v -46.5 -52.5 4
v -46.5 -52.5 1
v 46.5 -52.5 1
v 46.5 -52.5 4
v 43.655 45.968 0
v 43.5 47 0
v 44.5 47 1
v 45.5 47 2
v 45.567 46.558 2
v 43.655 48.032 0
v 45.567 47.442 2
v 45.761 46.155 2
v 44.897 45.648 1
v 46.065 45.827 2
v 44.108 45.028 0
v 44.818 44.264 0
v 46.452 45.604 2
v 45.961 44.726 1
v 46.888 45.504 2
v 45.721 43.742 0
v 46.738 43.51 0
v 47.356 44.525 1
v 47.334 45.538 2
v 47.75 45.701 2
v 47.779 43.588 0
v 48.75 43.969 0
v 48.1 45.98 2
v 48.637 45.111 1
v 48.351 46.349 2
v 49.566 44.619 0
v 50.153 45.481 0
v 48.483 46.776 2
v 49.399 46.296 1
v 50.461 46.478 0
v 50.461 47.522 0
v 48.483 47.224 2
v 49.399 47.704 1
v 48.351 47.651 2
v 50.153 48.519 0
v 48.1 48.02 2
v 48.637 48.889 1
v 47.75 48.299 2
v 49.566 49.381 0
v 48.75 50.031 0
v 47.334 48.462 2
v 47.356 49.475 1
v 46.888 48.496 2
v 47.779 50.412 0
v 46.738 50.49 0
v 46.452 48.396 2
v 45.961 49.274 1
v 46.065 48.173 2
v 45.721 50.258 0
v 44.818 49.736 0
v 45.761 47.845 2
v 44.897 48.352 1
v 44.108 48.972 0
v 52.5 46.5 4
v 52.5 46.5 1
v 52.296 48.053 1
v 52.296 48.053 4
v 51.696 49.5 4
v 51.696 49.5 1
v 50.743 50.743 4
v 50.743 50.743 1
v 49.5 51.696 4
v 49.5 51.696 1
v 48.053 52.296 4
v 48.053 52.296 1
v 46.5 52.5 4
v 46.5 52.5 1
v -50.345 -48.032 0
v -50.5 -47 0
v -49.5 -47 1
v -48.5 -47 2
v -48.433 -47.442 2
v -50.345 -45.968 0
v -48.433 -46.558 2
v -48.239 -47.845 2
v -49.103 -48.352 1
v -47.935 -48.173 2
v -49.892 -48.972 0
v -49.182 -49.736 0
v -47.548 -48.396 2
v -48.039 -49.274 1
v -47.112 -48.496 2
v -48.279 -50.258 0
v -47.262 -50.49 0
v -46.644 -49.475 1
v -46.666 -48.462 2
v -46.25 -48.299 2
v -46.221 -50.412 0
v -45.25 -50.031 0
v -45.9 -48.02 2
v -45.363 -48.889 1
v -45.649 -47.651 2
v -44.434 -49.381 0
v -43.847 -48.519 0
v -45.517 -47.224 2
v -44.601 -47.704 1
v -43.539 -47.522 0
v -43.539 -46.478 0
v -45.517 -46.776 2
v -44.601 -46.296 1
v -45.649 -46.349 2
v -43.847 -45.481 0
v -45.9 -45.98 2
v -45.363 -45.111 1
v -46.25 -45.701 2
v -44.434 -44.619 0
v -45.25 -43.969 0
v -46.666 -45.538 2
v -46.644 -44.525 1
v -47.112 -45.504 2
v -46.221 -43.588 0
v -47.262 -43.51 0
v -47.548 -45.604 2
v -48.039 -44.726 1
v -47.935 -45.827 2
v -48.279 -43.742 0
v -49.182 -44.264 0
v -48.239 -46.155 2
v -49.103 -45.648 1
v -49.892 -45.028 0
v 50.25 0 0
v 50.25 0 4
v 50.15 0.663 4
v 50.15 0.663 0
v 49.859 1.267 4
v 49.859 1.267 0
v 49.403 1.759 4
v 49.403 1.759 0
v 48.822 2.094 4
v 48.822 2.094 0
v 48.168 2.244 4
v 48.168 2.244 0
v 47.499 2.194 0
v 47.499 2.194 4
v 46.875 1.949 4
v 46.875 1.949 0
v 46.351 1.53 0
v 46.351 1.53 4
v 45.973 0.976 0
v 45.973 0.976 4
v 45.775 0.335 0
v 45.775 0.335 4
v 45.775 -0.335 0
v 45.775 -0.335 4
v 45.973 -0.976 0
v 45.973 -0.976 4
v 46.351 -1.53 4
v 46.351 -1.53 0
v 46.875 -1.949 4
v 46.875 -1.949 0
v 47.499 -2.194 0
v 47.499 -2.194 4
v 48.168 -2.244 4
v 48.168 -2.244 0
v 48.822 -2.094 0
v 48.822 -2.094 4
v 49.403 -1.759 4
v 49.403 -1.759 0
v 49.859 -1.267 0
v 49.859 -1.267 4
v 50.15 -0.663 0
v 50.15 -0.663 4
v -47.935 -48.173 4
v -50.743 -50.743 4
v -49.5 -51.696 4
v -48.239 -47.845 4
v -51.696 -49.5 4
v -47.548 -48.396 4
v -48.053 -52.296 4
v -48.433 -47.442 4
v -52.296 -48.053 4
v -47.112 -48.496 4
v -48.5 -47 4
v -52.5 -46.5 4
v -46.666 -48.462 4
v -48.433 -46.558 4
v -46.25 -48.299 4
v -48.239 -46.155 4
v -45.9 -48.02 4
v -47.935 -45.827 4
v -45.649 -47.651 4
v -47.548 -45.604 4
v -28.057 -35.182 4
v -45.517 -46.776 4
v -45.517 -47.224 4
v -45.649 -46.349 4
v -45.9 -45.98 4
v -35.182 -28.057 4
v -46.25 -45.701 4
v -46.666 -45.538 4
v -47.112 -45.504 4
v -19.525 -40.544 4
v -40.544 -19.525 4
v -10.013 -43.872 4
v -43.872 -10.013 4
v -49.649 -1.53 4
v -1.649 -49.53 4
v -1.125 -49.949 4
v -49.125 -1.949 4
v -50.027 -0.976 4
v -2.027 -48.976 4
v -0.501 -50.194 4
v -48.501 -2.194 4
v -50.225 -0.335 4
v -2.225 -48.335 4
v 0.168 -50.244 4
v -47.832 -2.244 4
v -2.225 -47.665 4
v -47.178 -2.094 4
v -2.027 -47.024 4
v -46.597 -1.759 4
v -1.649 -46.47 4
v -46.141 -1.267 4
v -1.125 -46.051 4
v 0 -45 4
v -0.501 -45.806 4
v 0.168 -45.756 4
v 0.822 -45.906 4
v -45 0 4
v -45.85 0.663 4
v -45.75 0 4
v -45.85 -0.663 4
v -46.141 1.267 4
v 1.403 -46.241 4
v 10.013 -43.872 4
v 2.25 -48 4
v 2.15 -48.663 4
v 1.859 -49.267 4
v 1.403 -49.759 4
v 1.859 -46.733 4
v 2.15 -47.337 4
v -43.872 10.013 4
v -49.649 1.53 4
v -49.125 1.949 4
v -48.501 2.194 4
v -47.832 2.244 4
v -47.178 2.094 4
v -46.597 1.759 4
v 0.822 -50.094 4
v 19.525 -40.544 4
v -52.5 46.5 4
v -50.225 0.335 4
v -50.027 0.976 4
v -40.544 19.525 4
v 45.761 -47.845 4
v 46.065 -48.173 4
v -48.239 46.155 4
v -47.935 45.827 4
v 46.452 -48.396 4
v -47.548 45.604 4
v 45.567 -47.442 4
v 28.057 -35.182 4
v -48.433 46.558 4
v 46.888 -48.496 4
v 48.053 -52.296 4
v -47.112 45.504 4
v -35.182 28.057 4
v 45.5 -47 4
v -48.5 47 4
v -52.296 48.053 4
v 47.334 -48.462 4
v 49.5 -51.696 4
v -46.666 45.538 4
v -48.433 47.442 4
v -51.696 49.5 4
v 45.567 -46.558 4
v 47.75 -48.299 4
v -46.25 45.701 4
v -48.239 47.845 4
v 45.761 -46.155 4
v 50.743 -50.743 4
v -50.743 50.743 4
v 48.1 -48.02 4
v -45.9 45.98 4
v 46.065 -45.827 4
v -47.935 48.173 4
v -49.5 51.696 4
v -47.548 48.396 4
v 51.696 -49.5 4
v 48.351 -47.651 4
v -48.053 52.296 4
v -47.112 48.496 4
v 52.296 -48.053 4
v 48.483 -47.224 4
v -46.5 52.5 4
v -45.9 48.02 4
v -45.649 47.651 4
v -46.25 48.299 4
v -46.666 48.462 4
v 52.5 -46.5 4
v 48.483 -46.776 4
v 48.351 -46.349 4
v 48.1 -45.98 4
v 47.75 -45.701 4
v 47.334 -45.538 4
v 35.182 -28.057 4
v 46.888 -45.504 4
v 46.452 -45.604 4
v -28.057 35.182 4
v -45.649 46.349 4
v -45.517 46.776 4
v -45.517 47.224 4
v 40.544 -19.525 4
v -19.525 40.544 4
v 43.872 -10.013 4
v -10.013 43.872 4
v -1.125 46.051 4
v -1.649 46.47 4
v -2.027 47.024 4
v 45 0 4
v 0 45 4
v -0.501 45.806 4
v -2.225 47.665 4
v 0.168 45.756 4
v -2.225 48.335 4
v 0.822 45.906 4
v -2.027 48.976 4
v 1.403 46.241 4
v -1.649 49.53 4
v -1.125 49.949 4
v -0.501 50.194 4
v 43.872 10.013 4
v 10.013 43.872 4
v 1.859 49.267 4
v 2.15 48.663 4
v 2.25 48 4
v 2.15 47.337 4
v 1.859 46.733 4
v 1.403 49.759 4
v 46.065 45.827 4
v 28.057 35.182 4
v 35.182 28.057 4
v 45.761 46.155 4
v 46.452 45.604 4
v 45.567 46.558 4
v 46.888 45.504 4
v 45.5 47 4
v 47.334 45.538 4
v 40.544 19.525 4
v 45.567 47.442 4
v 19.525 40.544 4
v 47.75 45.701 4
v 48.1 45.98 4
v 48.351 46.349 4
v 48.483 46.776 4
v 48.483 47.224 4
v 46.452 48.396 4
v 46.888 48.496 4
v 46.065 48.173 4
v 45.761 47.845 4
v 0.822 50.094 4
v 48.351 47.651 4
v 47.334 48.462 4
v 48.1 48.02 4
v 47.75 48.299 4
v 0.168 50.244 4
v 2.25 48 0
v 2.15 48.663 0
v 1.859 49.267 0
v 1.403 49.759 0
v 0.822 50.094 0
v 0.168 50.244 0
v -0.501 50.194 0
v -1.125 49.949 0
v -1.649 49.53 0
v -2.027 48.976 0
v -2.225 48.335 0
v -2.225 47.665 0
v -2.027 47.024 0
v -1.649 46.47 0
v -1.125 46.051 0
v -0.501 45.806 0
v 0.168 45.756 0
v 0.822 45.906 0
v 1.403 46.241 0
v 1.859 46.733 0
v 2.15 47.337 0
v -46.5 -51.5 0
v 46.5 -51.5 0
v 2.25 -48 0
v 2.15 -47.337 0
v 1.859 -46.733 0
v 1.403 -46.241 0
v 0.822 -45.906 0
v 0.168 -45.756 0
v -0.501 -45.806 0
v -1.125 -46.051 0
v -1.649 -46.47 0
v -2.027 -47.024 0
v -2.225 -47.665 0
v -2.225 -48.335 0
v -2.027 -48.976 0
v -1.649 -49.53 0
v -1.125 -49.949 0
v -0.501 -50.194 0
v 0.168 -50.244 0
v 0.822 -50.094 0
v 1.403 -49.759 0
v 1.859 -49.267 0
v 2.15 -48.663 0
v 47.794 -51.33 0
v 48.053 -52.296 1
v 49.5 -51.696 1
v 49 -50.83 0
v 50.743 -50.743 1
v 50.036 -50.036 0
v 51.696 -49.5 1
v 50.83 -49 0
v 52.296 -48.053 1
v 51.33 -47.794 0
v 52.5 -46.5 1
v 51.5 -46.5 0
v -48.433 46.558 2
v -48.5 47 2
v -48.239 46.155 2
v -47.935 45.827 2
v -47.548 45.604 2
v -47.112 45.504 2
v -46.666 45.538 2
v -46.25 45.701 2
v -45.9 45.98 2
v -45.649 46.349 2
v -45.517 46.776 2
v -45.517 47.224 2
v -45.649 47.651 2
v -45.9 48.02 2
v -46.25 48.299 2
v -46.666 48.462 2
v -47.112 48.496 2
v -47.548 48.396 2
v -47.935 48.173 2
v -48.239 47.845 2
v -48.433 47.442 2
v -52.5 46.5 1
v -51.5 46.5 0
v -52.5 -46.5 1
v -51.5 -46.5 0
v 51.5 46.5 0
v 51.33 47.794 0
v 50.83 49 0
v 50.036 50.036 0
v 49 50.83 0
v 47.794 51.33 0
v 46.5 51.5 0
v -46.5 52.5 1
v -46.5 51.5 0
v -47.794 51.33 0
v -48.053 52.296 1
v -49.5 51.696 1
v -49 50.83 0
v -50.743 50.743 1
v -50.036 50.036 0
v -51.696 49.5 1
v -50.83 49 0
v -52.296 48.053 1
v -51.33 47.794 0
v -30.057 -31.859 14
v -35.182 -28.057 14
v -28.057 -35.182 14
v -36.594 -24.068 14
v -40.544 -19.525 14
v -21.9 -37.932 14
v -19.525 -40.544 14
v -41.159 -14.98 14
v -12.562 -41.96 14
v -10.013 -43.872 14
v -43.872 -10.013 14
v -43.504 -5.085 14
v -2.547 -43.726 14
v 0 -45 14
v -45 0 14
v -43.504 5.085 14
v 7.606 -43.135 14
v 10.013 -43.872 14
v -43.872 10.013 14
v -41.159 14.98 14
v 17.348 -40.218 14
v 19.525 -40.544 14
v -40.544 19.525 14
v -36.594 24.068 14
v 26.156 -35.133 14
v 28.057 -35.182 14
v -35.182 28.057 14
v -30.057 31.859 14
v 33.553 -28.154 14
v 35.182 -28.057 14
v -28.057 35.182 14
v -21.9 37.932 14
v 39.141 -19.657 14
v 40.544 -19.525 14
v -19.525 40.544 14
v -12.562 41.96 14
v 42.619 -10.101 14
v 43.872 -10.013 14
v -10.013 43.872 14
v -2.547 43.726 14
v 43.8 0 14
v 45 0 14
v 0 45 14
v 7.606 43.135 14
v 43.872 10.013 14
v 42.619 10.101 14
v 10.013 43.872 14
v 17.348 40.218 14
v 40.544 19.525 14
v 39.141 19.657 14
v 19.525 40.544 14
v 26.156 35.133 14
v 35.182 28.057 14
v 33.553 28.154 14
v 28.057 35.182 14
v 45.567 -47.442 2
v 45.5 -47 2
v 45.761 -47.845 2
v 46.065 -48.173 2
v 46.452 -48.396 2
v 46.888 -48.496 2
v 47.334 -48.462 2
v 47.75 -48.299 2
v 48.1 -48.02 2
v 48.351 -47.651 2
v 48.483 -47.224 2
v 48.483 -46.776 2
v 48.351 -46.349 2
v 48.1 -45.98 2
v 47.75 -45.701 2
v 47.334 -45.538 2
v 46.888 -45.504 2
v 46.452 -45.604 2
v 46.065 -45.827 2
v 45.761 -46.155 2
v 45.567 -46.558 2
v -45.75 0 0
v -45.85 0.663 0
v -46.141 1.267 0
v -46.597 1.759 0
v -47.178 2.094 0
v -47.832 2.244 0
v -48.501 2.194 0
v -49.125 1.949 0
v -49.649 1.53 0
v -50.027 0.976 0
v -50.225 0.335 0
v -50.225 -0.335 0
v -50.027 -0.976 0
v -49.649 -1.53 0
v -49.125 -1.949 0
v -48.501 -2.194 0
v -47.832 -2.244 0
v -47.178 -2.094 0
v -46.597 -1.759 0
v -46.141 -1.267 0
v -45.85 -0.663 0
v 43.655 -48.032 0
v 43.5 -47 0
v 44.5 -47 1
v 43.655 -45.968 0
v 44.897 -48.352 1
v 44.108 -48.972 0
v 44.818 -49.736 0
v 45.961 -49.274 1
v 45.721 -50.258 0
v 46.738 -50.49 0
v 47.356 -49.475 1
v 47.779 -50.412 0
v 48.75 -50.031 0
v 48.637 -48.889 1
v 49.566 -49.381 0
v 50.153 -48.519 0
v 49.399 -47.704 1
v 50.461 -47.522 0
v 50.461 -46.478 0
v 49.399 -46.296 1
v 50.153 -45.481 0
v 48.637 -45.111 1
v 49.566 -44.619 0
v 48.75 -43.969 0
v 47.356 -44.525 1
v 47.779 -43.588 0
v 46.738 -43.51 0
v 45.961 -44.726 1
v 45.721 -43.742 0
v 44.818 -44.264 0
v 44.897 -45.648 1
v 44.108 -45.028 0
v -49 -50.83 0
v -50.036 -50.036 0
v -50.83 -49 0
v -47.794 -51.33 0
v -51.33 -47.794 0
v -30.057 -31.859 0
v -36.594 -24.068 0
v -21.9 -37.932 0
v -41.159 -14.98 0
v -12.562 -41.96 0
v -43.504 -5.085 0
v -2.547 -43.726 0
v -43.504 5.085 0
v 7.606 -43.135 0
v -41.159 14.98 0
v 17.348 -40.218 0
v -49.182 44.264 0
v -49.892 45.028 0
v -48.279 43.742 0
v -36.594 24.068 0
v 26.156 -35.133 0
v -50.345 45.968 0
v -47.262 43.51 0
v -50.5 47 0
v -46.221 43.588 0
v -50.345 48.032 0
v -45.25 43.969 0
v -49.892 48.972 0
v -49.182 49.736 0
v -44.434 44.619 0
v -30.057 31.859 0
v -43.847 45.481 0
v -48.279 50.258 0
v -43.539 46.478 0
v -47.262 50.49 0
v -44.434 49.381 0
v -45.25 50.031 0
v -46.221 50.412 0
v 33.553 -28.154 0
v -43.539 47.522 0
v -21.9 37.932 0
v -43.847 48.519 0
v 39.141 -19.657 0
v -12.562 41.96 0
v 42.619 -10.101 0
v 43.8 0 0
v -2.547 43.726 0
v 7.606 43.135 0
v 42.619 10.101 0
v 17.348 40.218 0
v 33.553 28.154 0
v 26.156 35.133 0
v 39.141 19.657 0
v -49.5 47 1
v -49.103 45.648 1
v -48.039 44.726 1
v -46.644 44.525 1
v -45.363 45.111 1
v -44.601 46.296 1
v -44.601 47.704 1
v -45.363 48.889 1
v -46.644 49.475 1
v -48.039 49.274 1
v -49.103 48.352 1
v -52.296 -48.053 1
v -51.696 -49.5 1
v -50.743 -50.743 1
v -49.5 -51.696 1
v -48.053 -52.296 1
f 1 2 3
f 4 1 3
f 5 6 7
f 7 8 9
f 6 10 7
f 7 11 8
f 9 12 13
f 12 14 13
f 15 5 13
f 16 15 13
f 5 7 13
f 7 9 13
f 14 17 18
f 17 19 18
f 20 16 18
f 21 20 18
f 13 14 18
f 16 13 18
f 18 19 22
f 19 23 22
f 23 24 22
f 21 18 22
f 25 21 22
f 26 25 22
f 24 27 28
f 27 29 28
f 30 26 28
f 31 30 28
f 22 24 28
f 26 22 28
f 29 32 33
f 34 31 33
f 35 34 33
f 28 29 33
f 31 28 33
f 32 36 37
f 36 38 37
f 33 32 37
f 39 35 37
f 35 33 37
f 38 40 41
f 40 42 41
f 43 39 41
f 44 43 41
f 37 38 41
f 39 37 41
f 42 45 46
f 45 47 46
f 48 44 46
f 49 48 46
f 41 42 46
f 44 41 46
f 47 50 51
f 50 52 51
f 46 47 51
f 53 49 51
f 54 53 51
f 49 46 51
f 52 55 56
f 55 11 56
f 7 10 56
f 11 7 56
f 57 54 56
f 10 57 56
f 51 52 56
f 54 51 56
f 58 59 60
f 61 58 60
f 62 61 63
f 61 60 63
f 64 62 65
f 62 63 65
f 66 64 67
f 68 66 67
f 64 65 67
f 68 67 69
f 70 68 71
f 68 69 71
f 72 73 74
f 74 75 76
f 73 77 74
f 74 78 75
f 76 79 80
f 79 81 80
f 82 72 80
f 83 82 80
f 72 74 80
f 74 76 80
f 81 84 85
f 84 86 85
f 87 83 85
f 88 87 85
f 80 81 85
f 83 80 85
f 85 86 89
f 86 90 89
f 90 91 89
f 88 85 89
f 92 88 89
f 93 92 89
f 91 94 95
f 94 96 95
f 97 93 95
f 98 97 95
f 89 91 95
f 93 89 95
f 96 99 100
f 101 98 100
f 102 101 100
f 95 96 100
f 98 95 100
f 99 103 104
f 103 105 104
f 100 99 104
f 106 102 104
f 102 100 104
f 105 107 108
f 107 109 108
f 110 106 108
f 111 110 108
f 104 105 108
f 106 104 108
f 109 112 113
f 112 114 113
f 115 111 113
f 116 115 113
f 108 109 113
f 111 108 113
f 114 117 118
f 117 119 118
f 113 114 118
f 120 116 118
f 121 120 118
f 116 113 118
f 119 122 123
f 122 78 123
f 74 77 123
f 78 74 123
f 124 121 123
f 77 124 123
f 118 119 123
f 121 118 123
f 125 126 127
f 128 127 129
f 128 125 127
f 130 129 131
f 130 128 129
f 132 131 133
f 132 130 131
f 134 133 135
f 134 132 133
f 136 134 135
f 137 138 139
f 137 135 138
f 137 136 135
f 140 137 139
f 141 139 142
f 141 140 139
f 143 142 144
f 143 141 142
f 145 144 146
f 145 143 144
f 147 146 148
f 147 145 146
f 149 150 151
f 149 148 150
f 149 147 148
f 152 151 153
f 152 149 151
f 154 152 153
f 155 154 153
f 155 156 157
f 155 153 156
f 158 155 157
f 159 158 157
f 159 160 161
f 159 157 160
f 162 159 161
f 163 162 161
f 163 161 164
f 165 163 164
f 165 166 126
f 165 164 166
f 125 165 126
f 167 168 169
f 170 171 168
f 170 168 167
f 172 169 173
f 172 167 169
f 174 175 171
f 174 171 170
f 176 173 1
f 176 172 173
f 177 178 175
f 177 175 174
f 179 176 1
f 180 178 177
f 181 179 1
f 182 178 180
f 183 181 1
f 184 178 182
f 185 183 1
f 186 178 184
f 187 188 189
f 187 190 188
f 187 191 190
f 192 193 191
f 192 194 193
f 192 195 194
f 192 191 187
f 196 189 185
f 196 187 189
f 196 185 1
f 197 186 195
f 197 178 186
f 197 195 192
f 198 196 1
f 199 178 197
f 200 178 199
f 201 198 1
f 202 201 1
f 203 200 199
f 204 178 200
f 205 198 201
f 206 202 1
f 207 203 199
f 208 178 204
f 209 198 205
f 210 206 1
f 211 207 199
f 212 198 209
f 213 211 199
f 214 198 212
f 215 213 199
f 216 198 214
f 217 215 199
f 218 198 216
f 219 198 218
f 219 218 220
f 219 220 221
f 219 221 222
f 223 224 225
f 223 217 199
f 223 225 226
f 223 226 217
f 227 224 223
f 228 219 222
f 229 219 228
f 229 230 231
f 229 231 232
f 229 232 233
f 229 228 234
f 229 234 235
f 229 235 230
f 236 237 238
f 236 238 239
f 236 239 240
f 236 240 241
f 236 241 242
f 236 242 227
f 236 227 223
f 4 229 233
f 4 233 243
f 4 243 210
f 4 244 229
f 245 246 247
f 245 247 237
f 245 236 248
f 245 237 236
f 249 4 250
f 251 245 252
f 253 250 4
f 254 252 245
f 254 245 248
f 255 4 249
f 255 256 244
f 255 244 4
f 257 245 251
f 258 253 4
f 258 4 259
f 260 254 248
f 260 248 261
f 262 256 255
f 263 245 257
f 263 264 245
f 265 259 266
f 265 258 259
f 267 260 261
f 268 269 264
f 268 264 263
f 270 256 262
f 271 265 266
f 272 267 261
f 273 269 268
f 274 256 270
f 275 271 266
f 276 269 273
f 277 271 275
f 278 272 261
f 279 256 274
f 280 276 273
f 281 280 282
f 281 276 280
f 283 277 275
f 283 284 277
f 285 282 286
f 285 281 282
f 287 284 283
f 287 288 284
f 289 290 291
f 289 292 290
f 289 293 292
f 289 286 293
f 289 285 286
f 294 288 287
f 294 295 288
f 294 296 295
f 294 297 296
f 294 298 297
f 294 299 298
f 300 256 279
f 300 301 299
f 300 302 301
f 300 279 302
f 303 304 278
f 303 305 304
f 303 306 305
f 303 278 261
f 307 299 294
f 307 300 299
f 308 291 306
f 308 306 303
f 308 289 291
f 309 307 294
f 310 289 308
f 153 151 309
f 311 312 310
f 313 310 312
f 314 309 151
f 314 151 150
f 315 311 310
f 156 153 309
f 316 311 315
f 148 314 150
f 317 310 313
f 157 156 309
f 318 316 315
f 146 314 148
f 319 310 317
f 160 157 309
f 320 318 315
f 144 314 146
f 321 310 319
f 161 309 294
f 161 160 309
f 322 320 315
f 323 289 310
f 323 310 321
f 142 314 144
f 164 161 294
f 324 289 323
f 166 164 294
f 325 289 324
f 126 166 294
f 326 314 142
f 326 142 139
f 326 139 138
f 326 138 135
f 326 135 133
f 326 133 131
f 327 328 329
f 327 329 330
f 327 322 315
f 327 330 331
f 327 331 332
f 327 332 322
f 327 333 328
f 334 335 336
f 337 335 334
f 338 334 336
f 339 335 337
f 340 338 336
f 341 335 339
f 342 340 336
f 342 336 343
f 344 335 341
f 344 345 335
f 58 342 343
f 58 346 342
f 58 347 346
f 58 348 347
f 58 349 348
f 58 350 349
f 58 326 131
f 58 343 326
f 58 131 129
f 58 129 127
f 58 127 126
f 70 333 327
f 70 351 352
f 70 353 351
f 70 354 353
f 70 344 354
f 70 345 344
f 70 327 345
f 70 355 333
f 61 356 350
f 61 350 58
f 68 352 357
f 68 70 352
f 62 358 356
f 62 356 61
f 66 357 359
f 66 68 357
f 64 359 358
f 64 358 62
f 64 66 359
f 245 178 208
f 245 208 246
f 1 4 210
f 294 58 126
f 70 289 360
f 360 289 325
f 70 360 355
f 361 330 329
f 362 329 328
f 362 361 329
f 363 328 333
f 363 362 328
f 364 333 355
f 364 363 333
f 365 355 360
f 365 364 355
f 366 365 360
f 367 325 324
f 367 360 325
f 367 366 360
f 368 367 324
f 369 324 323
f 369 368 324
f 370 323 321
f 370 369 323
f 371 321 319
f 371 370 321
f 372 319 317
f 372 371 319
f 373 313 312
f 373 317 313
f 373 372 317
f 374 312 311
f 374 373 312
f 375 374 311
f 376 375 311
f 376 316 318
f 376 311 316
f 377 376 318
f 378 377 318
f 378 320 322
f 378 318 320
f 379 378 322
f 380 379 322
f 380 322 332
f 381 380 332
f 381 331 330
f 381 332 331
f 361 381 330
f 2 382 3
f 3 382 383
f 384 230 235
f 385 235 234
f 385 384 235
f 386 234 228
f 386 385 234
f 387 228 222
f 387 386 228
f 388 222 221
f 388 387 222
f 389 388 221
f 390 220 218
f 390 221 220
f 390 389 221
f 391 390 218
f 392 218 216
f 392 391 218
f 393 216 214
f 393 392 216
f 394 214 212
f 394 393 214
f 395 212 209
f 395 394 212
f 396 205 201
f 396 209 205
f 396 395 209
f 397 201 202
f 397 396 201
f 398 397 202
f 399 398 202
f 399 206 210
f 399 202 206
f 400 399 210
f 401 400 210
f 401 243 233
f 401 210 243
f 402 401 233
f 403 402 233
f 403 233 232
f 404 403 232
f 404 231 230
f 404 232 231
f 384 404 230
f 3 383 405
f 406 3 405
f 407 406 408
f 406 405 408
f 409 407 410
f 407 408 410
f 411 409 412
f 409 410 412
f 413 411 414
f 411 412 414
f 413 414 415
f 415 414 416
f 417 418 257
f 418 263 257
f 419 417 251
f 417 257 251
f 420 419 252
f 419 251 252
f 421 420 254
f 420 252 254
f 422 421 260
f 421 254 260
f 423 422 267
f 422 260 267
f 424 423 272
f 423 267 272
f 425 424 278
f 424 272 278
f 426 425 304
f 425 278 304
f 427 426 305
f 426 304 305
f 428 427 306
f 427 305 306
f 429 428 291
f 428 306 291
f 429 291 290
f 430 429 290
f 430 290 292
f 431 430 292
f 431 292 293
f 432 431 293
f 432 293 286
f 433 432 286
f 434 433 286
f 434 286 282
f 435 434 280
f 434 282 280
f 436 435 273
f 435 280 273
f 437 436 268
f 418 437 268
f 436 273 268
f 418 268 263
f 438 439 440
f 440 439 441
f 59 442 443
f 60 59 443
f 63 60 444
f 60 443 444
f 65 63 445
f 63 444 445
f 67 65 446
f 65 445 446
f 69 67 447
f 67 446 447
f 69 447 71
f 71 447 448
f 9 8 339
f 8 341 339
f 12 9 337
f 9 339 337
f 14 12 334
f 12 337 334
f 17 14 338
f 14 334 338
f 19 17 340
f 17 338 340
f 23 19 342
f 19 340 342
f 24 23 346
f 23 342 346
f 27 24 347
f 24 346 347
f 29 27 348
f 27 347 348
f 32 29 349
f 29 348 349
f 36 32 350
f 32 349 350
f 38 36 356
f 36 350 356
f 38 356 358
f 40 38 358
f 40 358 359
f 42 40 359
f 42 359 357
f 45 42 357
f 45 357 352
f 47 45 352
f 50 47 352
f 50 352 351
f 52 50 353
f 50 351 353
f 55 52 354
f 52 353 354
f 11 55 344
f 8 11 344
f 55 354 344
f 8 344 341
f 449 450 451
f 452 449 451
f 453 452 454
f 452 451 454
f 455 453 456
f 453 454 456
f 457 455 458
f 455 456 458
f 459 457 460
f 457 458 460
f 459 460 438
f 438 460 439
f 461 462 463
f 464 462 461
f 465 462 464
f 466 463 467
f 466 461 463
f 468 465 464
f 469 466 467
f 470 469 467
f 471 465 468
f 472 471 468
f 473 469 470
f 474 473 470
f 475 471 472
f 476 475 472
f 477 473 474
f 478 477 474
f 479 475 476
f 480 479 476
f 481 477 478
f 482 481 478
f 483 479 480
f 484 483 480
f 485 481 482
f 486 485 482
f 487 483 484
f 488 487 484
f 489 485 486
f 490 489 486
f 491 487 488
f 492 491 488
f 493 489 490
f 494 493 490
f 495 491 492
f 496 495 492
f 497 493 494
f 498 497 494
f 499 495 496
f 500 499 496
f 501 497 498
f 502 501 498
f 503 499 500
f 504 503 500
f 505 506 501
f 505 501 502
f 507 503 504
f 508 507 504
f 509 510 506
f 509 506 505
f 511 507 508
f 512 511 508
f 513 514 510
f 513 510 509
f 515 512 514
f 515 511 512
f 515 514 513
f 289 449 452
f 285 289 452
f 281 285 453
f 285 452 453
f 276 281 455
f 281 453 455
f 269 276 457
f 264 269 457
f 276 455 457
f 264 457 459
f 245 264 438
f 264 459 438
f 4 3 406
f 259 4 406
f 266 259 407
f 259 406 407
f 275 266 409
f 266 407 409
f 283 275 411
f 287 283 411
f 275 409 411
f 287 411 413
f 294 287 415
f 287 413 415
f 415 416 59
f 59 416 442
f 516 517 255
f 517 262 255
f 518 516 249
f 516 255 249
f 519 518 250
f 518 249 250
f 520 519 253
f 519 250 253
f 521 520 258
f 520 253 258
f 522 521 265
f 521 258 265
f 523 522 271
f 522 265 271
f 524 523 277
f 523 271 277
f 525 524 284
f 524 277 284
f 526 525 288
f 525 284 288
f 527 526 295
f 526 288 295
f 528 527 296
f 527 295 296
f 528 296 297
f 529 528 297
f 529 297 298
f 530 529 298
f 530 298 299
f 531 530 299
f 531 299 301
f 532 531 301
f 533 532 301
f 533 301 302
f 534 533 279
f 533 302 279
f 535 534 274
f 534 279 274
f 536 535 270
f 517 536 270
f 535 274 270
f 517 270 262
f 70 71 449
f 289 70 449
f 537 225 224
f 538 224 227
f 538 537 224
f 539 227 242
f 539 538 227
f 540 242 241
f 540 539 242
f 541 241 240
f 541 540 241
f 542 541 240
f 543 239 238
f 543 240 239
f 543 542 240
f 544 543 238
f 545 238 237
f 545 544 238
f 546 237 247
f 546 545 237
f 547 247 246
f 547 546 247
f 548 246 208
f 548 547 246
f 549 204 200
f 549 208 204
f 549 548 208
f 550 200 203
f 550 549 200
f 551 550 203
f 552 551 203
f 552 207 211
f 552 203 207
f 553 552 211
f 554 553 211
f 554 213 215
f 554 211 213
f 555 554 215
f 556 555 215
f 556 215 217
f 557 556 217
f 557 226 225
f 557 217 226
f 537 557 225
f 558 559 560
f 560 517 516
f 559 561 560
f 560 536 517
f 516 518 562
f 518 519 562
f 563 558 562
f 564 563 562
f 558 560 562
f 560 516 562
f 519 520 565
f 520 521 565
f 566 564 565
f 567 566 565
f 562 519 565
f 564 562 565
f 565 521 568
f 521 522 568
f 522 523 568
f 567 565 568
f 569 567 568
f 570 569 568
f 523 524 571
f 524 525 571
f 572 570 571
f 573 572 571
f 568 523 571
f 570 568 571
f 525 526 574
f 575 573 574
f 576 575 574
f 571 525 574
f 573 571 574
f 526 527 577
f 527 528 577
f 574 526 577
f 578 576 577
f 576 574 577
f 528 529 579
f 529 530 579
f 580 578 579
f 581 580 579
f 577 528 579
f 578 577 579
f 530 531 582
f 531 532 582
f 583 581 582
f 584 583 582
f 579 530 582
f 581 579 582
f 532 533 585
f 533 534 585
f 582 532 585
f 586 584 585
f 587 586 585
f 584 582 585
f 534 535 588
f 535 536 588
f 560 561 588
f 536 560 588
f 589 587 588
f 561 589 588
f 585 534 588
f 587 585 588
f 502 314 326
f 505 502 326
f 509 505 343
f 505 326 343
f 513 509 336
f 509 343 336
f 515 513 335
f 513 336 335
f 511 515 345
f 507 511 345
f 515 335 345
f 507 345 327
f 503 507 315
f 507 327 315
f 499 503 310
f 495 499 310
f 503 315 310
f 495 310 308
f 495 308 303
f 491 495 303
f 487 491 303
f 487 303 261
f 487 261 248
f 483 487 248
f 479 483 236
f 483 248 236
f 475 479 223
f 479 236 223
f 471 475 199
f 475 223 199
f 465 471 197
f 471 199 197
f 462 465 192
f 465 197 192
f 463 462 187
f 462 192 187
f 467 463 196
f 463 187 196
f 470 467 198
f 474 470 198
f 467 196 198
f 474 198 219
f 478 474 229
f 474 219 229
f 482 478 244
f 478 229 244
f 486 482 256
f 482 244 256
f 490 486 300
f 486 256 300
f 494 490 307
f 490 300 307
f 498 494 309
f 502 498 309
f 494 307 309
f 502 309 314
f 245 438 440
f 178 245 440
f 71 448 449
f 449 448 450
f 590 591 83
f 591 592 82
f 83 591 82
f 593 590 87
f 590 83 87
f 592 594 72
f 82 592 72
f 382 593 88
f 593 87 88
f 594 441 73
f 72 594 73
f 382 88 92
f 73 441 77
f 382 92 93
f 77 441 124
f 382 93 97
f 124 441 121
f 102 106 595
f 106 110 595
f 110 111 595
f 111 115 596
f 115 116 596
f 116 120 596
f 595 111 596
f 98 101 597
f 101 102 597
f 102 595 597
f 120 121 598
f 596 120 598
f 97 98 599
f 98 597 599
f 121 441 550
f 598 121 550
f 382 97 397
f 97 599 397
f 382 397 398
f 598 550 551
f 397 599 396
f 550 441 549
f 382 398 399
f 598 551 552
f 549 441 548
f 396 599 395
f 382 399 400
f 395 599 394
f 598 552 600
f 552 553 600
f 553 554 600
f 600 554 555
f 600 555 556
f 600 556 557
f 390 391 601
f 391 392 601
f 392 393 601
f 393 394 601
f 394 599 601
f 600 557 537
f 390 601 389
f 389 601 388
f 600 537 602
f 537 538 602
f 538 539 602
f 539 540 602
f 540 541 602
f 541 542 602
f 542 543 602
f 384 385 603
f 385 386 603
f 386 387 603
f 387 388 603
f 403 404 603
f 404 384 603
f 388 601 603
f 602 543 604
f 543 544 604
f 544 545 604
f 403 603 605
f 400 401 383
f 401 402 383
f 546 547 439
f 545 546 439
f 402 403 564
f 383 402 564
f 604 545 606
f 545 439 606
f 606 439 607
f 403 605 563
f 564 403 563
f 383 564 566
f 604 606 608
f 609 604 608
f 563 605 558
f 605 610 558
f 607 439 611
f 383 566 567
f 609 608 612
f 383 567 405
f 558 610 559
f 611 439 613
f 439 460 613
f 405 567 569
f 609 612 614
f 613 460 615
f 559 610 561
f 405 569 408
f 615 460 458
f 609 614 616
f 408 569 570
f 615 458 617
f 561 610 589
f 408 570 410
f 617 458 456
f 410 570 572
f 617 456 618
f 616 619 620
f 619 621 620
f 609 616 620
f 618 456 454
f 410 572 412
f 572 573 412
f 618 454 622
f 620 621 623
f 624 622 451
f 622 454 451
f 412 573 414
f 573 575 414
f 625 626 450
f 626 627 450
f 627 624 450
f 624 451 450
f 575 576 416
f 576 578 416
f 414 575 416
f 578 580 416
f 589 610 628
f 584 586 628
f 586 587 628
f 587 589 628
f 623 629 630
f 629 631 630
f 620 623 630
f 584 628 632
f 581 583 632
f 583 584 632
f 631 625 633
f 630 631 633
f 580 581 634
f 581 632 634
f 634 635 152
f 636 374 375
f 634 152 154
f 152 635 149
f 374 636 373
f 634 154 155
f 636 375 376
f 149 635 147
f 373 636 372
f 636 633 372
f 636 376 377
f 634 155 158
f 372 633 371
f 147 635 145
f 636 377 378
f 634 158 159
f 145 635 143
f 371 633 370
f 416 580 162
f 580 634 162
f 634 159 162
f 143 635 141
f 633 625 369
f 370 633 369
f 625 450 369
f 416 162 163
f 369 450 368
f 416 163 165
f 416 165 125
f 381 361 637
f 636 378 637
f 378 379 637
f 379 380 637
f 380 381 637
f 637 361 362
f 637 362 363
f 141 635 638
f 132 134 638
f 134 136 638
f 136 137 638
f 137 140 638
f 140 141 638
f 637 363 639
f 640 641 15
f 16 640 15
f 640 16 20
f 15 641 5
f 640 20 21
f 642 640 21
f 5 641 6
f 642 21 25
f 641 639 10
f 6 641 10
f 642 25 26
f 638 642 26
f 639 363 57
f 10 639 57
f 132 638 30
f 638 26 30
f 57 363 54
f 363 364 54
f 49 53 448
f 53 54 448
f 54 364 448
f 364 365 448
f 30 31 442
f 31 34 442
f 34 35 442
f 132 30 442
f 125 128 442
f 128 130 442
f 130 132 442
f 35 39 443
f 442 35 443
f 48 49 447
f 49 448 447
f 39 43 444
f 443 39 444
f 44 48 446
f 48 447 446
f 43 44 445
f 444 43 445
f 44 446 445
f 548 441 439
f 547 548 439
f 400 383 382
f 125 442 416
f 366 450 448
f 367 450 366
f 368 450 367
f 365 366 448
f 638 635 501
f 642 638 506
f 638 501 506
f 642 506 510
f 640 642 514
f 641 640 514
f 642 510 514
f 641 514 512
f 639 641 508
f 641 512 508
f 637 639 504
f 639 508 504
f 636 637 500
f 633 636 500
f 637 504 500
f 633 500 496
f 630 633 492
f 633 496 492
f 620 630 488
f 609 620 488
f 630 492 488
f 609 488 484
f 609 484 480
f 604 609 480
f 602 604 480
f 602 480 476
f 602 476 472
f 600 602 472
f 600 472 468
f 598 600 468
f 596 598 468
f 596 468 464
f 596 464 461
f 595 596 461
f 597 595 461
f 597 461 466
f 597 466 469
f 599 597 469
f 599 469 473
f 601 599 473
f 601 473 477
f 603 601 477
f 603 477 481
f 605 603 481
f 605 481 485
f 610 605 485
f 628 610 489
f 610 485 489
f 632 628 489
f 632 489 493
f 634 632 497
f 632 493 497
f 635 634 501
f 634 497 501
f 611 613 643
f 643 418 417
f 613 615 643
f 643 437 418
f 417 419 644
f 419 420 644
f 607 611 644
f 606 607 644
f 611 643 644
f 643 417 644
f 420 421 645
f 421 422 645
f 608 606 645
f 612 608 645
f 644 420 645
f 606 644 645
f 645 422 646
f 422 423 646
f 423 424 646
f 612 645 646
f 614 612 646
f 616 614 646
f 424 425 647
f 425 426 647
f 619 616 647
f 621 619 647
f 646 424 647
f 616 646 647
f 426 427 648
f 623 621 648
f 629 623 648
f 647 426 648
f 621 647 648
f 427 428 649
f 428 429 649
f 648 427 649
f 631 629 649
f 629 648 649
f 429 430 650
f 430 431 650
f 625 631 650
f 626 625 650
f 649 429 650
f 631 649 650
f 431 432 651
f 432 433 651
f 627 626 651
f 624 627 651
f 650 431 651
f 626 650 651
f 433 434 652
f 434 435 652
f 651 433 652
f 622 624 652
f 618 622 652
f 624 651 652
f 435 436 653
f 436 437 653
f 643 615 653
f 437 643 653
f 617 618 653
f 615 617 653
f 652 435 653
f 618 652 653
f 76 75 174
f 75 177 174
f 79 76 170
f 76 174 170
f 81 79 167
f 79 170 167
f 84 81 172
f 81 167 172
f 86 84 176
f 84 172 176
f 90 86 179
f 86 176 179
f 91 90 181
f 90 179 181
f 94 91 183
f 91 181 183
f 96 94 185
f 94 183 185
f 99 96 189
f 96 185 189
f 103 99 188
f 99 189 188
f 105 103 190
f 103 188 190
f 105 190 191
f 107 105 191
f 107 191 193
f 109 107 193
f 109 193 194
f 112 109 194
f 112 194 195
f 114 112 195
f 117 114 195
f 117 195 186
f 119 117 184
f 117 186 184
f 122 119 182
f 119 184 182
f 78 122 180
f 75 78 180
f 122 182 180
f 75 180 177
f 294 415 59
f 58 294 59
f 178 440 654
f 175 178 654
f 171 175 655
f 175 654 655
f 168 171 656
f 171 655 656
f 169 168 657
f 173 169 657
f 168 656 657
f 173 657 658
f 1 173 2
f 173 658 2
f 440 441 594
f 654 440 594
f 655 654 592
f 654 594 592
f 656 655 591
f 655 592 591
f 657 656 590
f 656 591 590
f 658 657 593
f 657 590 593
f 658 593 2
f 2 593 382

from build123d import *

# Parameters (mm, degrees)
PAD_DEPTH        = 4
HOLE_D           = 3
HOLE_CSINK_D     = 7
HOLE_CSINK_ANGLE = 90
SKETCH002_R      = 45
PAD001_DEPTH     = 10
SKETCH003_R      = 43.8
POCKET_DEPTH     = 14.001
SKETCH004_R      = 2.25
HOLE001_DEPTH    = 25
CHAMFER_SIZE     = 1


with BuildPart() as part:
    # Sketch → Pad (new body)
    with BuildSketch(Plane.XY):
        with BuildLine():
            Line((-52.5, 46.5), (-52.5, -46.5))
            ThreePointArc((-52.5, -46.5), (-50.742641, -50.742641), (-46.5, -52.5))
            Line((-46.5, -52.5), (46.5, -52.5))
            ThreePointArc((46.5, -52.5), (50.742641, -50.742641), (52.5, -46.5))
            Line((52.5, -46.5), (52.5, 46.5))
            ThreePointArc((52.5, 46.5), (50.742641, 50.742641), (46.5, 52.5))
            Line((46.5, 52.5), (-46.5, 52.5))
            ThreePointArc((-46.5, 52.5), (-50.742641, 50.742641), (-52.5, 46.5))
        make_face()
    extrude(amount=PAD_DEPTH)

    # Hole (through all)
    with Locations(Plane(origin=(0, 0, 0), x_dir=(1, 0, 0), z_dir=(0, 0, -1))):
        with Locations((-47, -47), (47, -47), (47, 47), (-47, 47)):
            CounterSinkHole(HOLE_D / 2, HOLE_CSINK_D / 2, counter_sink_angle=HOLE_CSINK_ANGLE)

    # Sketch002 (on DatumPlane) → Pad001 (join)
    with BuildSketch(Plane.XY.offset(4)):
        Circle(SKETCH002_R)
    extrude(amount=PAD001_DEPTH)

    # Sketch003 (on Face20 of Pad001) → Pocket (cut, through all)
    with BuildSketch(Plane.XY.offset(14)):
        Circle(SKETCH003_R)
    extrude(amount=-POCKET_DEPTH, mode=Mode.SUBTRACT)

    # Sketch004 → Hole001 (cut)
    with BuildSketch(Plane.XY):
        with Locations((0, 48)):
            Circle(SKETCH004_R)
        with Locations((48, 0)):
            Circle(SKETCH004_R)
        with Locations((0, -48)):
            Circle(SKETCH004_R)
        with Locations((-48, 0)):
            Circle(SKETCH004_R)
    extrude(amount=HOLE001_DEPTH, mode=Mode.SUBTRACT)

    # Chamfer
    chamfer_edges = [part.edges().sort_by_distance(p)[0] for p in [
        (-52.5, 0, 0),
    ]]
    chamfer(chamfer_edges, length=CHAMFER_SIZE)


solid = part.part
